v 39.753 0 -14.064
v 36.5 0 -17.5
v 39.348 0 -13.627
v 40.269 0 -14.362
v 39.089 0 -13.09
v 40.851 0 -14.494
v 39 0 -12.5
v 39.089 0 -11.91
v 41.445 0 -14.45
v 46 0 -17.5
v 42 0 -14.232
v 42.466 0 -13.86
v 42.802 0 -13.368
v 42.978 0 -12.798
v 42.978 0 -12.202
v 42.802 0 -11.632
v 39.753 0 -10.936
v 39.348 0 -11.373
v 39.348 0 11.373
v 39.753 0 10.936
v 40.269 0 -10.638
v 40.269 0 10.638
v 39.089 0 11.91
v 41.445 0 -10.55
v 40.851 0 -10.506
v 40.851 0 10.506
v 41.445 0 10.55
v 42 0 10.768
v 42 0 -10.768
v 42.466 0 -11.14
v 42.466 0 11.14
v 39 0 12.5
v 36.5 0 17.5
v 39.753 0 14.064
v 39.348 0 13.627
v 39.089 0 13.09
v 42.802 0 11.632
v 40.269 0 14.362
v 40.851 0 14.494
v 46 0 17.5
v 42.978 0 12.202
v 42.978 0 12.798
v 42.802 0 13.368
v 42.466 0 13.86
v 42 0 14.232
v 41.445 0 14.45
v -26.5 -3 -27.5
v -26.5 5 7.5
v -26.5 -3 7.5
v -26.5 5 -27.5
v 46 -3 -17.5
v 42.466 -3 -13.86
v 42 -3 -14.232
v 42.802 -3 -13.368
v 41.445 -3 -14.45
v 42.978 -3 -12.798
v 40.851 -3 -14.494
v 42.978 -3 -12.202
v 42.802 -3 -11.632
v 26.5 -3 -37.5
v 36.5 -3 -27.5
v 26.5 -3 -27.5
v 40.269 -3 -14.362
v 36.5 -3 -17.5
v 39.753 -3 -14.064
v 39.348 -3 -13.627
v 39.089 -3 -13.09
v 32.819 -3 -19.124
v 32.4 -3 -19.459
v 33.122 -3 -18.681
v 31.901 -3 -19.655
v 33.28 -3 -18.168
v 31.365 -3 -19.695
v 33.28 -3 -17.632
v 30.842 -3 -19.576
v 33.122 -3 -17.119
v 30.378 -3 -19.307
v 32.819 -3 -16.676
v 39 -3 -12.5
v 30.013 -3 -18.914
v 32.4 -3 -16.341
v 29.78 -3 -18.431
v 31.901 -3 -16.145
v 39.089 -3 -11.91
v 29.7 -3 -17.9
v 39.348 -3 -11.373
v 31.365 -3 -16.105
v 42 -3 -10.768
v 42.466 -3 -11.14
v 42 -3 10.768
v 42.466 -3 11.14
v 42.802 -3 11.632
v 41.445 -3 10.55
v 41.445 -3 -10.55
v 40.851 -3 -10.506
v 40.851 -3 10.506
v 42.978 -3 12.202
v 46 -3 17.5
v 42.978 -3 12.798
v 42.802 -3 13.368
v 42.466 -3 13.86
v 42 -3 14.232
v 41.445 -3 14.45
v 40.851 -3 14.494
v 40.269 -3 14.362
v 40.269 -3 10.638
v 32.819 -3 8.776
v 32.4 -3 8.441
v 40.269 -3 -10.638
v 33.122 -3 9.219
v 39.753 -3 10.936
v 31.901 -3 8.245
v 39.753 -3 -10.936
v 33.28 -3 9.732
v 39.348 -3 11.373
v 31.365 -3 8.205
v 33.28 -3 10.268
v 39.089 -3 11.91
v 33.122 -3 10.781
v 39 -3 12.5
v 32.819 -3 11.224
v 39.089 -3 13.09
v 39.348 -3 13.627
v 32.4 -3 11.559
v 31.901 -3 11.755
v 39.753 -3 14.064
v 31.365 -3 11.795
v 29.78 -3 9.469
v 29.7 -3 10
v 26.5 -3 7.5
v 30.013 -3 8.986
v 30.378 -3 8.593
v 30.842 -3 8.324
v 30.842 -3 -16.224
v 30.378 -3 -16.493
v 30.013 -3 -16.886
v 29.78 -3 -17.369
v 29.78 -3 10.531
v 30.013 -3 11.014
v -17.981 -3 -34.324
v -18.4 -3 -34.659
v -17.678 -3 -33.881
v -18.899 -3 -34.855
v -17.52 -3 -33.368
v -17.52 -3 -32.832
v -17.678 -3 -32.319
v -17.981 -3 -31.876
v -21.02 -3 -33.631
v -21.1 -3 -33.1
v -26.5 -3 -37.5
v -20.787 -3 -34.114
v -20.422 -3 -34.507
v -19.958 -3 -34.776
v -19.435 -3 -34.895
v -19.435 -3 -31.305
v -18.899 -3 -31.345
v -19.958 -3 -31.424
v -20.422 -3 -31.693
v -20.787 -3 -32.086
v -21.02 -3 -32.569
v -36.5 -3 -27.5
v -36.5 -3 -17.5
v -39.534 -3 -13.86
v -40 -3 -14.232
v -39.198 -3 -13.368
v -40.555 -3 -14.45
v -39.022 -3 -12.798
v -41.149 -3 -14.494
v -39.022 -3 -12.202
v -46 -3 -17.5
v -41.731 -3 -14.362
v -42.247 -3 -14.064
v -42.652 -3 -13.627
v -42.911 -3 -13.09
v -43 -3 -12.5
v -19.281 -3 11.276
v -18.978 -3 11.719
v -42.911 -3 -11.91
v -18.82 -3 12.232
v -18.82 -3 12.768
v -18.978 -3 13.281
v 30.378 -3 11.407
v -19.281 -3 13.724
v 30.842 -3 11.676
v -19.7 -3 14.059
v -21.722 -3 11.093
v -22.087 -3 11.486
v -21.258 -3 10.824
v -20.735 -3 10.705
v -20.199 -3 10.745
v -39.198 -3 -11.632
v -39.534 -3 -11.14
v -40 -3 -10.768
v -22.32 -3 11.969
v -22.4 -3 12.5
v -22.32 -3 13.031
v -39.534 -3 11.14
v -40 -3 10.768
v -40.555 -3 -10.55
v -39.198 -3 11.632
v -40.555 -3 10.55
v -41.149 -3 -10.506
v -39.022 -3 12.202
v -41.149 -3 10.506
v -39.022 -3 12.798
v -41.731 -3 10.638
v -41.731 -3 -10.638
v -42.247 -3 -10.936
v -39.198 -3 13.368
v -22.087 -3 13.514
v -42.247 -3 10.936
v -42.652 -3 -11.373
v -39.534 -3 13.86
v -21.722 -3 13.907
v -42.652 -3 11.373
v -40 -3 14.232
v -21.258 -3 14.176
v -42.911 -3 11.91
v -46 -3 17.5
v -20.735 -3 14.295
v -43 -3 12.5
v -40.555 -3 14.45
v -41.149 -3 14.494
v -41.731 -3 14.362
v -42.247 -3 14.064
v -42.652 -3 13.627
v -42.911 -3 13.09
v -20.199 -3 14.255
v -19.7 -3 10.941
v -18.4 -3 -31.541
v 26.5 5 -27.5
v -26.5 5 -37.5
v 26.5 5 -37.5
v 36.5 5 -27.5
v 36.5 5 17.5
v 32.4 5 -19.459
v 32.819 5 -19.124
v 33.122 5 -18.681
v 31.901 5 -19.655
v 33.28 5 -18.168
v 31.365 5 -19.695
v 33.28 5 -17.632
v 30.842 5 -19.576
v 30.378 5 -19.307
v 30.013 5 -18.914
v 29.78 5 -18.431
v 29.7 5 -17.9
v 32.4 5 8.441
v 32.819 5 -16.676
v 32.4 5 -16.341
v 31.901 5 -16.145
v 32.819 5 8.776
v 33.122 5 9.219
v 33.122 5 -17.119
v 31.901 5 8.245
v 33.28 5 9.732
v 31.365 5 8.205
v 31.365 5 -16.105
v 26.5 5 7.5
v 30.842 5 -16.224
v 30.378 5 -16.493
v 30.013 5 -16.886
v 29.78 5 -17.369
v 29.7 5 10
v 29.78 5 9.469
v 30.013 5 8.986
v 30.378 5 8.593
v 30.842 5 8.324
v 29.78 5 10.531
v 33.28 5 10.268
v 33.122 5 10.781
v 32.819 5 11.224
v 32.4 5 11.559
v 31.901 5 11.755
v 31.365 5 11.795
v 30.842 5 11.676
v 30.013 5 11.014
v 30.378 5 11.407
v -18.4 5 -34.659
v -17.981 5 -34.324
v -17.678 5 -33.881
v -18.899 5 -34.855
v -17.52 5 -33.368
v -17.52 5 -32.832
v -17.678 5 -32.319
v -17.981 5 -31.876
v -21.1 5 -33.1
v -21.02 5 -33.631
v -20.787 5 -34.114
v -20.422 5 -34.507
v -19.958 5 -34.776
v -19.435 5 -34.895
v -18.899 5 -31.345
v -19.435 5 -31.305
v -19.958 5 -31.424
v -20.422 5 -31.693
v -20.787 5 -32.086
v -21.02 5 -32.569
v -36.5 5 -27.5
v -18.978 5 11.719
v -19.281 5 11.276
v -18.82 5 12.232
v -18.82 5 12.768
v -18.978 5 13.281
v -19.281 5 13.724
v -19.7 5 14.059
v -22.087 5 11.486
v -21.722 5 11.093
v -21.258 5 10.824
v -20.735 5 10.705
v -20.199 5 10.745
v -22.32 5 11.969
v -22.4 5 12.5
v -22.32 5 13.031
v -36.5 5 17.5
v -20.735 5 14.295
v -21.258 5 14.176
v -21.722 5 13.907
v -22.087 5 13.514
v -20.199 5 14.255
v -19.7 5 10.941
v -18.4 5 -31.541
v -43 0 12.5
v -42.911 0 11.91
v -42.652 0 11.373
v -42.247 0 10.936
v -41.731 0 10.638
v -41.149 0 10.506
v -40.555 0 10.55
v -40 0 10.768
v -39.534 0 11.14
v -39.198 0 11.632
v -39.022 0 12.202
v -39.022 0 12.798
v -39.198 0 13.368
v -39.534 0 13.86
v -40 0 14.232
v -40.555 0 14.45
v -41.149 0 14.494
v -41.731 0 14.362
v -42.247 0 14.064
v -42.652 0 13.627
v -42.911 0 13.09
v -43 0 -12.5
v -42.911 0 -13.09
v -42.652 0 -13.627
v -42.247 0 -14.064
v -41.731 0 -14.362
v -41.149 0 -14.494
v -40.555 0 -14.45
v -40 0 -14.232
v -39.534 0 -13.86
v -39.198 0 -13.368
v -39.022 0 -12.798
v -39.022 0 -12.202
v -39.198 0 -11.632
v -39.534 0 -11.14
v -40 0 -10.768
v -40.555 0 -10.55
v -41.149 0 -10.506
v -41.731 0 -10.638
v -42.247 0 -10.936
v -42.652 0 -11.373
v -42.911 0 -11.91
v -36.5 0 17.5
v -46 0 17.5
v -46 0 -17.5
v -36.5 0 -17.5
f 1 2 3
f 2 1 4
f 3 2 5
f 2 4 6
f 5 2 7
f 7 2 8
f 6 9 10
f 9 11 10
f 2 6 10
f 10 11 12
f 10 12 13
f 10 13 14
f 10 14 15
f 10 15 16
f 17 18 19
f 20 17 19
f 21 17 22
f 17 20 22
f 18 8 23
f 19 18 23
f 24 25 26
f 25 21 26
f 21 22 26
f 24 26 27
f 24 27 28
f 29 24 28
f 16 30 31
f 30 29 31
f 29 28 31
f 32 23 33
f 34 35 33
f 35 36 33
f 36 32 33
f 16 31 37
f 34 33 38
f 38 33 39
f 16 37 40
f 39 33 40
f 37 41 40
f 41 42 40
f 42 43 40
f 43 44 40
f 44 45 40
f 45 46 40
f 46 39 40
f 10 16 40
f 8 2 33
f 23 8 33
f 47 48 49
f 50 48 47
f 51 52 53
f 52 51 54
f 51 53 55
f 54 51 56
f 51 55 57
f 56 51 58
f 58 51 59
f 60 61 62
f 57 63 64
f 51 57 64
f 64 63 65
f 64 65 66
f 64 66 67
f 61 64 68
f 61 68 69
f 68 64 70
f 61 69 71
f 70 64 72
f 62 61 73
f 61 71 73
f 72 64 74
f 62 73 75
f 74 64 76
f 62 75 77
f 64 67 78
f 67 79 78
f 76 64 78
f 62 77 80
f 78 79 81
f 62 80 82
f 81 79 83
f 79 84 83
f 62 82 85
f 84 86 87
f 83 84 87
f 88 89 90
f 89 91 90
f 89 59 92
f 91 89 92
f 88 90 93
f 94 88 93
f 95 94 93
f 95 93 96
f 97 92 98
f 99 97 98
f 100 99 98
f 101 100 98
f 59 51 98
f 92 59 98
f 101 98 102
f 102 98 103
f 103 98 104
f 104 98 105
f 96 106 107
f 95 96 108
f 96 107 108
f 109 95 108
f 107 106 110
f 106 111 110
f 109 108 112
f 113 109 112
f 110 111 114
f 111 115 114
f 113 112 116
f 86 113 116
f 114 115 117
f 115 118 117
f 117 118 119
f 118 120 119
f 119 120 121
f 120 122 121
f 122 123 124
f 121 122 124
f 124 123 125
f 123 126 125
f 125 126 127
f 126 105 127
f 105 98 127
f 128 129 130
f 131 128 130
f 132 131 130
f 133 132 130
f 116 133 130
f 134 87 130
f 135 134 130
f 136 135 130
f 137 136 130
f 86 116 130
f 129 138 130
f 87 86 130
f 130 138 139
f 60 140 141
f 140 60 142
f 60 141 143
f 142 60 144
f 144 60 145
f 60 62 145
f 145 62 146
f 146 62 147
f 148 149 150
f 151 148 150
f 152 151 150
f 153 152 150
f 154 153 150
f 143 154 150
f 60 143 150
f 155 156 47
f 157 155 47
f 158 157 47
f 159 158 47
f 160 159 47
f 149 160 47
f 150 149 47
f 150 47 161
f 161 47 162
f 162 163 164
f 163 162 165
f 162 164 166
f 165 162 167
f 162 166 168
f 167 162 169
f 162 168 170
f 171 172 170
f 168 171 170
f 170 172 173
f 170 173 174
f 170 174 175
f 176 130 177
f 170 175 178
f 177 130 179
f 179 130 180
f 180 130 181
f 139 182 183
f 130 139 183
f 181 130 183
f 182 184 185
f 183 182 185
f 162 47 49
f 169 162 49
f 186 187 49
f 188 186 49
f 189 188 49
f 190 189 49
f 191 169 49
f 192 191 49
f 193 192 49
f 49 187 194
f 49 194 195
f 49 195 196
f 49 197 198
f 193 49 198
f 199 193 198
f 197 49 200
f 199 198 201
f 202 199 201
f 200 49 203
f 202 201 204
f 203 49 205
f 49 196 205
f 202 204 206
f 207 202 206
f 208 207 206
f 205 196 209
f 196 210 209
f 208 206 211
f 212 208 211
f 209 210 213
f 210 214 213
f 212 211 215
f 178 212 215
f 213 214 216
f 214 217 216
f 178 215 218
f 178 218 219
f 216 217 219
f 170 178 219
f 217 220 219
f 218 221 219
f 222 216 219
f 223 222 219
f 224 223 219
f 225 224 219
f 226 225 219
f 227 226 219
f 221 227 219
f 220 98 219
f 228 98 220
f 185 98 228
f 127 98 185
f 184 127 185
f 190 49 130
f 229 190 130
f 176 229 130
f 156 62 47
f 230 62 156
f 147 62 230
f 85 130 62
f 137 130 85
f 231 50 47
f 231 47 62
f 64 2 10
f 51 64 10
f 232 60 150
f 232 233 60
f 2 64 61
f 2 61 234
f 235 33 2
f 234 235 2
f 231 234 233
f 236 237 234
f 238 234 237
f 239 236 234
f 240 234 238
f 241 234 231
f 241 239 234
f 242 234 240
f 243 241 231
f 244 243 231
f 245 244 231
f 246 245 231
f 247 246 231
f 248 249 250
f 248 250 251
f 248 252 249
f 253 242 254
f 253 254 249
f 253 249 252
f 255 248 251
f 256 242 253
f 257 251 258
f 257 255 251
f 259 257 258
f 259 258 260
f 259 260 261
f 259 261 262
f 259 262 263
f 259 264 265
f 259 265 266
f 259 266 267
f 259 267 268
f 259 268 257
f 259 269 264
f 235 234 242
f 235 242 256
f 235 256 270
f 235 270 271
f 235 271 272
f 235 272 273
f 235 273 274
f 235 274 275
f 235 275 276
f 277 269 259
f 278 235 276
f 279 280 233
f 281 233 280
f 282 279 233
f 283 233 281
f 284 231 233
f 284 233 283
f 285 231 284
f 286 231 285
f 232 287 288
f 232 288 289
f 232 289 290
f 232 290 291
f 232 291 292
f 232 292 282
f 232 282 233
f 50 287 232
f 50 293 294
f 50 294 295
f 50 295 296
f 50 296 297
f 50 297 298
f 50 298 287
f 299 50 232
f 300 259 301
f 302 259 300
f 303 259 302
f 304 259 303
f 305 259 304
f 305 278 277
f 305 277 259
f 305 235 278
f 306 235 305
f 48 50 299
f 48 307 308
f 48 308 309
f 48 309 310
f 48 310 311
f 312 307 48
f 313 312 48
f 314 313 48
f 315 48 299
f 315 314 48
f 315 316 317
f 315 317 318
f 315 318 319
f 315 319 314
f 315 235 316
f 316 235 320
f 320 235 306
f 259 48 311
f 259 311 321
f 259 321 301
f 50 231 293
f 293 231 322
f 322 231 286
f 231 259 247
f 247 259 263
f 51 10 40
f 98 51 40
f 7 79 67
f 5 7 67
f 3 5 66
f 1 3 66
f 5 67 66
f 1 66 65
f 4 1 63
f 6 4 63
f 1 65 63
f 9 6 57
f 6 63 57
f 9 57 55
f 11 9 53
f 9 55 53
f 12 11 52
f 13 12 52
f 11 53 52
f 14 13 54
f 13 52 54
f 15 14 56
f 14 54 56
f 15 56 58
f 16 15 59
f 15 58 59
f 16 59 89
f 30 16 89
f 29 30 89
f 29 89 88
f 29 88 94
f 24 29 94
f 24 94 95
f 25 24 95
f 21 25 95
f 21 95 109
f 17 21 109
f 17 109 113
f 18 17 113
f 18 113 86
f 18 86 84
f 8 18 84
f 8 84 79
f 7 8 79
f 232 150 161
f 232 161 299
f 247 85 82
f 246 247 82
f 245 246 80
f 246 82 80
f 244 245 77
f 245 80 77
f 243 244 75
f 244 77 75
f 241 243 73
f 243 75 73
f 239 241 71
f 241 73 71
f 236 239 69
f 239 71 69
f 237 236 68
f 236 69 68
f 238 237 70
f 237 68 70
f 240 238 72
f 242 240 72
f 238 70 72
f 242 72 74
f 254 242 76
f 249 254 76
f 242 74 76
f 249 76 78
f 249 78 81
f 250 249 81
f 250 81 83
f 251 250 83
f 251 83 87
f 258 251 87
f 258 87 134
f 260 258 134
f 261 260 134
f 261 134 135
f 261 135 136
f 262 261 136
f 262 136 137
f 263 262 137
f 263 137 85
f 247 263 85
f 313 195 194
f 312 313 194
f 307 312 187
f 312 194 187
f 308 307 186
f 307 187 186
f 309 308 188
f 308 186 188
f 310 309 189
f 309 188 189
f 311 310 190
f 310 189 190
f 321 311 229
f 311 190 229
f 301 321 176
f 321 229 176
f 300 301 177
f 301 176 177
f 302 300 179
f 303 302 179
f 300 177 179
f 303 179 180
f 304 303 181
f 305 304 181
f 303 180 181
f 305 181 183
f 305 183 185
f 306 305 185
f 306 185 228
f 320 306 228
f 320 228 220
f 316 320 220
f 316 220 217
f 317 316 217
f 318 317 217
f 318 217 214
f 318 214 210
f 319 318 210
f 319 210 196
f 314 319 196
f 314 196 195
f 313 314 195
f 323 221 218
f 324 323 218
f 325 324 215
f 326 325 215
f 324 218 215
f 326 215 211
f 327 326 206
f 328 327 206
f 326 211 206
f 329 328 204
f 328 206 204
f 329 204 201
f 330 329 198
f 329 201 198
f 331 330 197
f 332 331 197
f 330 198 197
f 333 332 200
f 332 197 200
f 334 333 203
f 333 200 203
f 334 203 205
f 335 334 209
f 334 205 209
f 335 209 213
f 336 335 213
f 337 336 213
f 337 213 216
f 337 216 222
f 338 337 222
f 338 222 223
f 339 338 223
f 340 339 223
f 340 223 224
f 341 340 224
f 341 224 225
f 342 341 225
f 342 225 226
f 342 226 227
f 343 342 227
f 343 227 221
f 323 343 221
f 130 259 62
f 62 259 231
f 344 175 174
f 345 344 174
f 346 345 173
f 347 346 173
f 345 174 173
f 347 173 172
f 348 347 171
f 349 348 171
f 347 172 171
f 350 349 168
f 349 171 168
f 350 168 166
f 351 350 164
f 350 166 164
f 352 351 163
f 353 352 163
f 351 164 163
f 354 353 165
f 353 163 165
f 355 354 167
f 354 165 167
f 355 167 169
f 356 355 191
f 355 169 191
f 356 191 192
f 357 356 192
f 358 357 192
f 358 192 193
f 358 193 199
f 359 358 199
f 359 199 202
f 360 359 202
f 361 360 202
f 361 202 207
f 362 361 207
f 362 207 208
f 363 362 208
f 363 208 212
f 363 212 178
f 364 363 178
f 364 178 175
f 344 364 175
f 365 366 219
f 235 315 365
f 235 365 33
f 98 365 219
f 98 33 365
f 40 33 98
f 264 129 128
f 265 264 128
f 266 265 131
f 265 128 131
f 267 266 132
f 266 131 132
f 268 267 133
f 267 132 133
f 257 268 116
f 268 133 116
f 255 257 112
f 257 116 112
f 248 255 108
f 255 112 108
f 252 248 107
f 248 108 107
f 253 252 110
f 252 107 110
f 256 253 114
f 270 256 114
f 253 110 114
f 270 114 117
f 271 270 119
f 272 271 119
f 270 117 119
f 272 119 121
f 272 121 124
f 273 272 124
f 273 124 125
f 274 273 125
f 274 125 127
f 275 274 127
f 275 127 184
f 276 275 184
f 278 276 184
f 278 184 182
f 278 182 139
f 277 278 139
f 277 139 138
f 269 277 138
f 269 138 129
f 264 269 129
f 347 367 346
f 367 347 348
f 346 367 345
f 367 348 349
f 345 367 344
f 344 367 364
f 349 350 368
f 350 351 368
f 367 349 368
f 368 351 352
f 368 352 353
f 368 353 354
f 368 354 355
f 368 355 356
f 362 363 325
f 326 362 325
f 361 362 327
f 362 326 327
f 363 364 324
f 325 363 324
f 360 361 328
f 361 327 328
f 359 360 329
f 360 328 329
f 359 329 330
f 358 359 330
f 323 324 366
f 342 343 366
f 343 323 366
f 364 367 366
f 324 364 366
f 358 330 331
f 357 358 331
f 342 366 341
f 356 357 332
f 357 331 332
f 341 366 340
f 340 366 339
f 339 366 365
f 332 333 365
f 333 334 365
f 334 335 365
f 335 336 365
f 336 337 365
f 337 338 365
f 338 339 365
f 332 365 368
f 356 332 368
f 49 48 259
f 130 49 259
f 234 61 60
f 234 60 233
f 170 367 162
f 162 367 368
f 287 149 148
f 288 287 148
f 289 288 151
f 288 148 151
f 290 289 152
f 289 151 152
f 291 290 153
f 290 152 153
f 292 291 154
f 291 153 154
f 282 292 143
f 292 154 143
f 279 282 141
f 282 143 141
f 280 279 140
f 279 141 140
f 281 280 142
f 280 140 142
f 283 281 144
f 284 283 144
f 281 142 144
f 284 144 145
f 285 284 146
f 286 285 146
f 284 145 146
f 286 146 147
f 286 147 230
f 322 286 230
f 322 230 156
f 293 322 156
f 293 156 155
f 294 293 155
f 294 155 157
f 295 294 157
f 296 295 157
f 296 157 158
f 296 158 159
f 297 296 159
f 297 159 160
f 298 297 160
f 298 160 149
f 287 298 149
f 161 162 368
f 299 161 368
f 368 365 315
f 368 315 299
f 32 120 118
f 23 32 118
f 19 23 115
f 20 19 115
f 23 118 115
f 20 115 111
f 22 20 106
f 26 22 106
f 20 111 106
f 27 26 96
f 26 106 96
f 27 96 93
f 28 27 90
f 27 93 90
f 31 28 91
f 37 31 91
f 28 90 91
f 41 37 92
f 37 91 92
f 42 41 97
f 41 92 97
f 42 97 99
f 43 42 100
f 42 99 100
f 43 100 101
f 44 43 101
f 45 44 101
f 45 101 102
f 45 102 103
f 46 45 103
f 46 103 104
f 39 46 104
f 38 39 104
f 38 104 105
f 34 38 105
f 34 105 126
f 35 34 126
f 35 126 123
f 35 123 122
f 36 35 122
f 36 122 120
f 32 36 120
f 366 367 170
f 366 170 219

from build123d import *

# Parameters (mm, degrees)
SKETCH1_W                = 73
SKETCH1_H                = 35
BOSS_EXTRUDE1_DEPTH      = 5
SKETCH2_W                = 92
SKETCH2_H                = 35
BOSS_EXTRUDE2_DEPTH      = 3
M3_CLEARANCE_HOLE1_D     = 4
M3_CLEARANCE_HOLE1_DEPTH = 10
M3_CLEARANCE_HOLE1_TIP   = 1.201721238
SKETCH9_W                = 73
SKETCH9_H                = 8
BOSS_EXTRUDE3_DEPTH      = 20
M3_CLEARANCE_HOLE3_D     = 3.6
M3_CLEARANCE_HOLE3_DEPTH = 10
M3_CLEARANCE_HOLE3_TIP   = 1.081549114
SKETCH12_W               = 53
SKETCH12_H               = 35
CUT_EXTRUDE1_DEPTH       = 9
CHAMFER1_SIZE            = 10


with BuildPart() as part:
    # Sketch1 → Boss-Extrude1 (new body)
    with BuildSketch(Plane(origin=(0, 0, 0), x_dir=(1, 0, 0), z_dir=(0, 1, 0))):
        Rectangle(SKETCH1_W, SKETCH1_H)
    extrude(amount=BOSS_EXTRUDE1_DEPTH)

    # Sketch2 → Boss-Extrude2 (add)
    with BuildSketch(Plane.XZ):
        Rectangle(SKETCH2_W, SKETCH2_H)
    extrude(amount=BOSS_EXTRUDE2_DEPTH)

    # M3 Clearance Hole1
    with Locations(Plane(origin=(0, 0, 0), x_dir=(1, 0, 0), z_dir=(0, 1, 0))):
        with Locations((-41, 12.5), (-41, -12.5), (41, 12.5), (41, -12.5)):
            Hole(M3_CLEARANCE_HOLE1_D / 2, depth=M3_CLEARANCE_HOLE1_DEPTH)
            with Locations((0, 0, -(M3_CLEARANCE_HOLE1_DEPTH + M3_CLEARANCE_HOLE1_TIP / 2))):  # 118° drill point
                Cone(0, M3_CLEARANCE_HOLE1_D / 2, M3_CLEARANCE_HOLE1_TIP, mode=Mode.SUBTRACT)

    # Sketch9 → Boss-Extrude3 (add)
    with BuildSketch(Plane(origin=(0, 0, -17.5), x_dir=(-1, 0, 0), z_dir=(0, 0, -1))):
        with Locations((0, 1)):
            Rectangle(SKETCH9_W, SKETCH9_H)
    extrude(amount=BOSS_EXTRUDE3_DEPTH)

    # M3 Clearance Hole3
    with Locations(Plane(origin=(0, 5, 0), x_dir=(1, 0, 0), z_dir=(0, 1, 0))):
        with Locations((-20.6, -12.5), (-19.3, 33.1), (31.5, -10), (31.5, 17.9)):
            Hole(M3_CLEARANCE_HOLE3_D / 2, depth=M3_CLEARANCE_HOLE3_DEPTH)
            with Locations((0, 0, -(M3_CLEARANCE_HOLE3_DEPTH + M3_CLEARANCE_HOLE3_TIP / 2))):  # 118° drill point
                Cone(0, M3_CLEARANCE_HOLE3_D / 2, M3_CLEARANCE_HOLE3_TIP, mode=Mode.SUBTRACT)

    # Sketch12 → Cut-Extrude1 (cut, through all)
    with BuildSketch(Plane(origin=(0, 5, 0), x_dir=(1, 0, 0), z_dir=(0, 1, 0))):
        with Locations((0, 10)):
            Rectangle(SKETCH12_W, SKETCH12_H)
    extrude(amount=-CUT_EXTRUDE1_DEPTH, mode=Mode.SUBTRACT)

    # Chamfer1
    chamfer1_edges = [part.edges().sort_by_distance(p)[0] for p in [
        (36.5, 1, -37.5),
        (-36.5, 1, -37.5),
    ]]
    chamfer(chamfer1_edges, length=CHAMFER1_SIZE)


solid = part.part
